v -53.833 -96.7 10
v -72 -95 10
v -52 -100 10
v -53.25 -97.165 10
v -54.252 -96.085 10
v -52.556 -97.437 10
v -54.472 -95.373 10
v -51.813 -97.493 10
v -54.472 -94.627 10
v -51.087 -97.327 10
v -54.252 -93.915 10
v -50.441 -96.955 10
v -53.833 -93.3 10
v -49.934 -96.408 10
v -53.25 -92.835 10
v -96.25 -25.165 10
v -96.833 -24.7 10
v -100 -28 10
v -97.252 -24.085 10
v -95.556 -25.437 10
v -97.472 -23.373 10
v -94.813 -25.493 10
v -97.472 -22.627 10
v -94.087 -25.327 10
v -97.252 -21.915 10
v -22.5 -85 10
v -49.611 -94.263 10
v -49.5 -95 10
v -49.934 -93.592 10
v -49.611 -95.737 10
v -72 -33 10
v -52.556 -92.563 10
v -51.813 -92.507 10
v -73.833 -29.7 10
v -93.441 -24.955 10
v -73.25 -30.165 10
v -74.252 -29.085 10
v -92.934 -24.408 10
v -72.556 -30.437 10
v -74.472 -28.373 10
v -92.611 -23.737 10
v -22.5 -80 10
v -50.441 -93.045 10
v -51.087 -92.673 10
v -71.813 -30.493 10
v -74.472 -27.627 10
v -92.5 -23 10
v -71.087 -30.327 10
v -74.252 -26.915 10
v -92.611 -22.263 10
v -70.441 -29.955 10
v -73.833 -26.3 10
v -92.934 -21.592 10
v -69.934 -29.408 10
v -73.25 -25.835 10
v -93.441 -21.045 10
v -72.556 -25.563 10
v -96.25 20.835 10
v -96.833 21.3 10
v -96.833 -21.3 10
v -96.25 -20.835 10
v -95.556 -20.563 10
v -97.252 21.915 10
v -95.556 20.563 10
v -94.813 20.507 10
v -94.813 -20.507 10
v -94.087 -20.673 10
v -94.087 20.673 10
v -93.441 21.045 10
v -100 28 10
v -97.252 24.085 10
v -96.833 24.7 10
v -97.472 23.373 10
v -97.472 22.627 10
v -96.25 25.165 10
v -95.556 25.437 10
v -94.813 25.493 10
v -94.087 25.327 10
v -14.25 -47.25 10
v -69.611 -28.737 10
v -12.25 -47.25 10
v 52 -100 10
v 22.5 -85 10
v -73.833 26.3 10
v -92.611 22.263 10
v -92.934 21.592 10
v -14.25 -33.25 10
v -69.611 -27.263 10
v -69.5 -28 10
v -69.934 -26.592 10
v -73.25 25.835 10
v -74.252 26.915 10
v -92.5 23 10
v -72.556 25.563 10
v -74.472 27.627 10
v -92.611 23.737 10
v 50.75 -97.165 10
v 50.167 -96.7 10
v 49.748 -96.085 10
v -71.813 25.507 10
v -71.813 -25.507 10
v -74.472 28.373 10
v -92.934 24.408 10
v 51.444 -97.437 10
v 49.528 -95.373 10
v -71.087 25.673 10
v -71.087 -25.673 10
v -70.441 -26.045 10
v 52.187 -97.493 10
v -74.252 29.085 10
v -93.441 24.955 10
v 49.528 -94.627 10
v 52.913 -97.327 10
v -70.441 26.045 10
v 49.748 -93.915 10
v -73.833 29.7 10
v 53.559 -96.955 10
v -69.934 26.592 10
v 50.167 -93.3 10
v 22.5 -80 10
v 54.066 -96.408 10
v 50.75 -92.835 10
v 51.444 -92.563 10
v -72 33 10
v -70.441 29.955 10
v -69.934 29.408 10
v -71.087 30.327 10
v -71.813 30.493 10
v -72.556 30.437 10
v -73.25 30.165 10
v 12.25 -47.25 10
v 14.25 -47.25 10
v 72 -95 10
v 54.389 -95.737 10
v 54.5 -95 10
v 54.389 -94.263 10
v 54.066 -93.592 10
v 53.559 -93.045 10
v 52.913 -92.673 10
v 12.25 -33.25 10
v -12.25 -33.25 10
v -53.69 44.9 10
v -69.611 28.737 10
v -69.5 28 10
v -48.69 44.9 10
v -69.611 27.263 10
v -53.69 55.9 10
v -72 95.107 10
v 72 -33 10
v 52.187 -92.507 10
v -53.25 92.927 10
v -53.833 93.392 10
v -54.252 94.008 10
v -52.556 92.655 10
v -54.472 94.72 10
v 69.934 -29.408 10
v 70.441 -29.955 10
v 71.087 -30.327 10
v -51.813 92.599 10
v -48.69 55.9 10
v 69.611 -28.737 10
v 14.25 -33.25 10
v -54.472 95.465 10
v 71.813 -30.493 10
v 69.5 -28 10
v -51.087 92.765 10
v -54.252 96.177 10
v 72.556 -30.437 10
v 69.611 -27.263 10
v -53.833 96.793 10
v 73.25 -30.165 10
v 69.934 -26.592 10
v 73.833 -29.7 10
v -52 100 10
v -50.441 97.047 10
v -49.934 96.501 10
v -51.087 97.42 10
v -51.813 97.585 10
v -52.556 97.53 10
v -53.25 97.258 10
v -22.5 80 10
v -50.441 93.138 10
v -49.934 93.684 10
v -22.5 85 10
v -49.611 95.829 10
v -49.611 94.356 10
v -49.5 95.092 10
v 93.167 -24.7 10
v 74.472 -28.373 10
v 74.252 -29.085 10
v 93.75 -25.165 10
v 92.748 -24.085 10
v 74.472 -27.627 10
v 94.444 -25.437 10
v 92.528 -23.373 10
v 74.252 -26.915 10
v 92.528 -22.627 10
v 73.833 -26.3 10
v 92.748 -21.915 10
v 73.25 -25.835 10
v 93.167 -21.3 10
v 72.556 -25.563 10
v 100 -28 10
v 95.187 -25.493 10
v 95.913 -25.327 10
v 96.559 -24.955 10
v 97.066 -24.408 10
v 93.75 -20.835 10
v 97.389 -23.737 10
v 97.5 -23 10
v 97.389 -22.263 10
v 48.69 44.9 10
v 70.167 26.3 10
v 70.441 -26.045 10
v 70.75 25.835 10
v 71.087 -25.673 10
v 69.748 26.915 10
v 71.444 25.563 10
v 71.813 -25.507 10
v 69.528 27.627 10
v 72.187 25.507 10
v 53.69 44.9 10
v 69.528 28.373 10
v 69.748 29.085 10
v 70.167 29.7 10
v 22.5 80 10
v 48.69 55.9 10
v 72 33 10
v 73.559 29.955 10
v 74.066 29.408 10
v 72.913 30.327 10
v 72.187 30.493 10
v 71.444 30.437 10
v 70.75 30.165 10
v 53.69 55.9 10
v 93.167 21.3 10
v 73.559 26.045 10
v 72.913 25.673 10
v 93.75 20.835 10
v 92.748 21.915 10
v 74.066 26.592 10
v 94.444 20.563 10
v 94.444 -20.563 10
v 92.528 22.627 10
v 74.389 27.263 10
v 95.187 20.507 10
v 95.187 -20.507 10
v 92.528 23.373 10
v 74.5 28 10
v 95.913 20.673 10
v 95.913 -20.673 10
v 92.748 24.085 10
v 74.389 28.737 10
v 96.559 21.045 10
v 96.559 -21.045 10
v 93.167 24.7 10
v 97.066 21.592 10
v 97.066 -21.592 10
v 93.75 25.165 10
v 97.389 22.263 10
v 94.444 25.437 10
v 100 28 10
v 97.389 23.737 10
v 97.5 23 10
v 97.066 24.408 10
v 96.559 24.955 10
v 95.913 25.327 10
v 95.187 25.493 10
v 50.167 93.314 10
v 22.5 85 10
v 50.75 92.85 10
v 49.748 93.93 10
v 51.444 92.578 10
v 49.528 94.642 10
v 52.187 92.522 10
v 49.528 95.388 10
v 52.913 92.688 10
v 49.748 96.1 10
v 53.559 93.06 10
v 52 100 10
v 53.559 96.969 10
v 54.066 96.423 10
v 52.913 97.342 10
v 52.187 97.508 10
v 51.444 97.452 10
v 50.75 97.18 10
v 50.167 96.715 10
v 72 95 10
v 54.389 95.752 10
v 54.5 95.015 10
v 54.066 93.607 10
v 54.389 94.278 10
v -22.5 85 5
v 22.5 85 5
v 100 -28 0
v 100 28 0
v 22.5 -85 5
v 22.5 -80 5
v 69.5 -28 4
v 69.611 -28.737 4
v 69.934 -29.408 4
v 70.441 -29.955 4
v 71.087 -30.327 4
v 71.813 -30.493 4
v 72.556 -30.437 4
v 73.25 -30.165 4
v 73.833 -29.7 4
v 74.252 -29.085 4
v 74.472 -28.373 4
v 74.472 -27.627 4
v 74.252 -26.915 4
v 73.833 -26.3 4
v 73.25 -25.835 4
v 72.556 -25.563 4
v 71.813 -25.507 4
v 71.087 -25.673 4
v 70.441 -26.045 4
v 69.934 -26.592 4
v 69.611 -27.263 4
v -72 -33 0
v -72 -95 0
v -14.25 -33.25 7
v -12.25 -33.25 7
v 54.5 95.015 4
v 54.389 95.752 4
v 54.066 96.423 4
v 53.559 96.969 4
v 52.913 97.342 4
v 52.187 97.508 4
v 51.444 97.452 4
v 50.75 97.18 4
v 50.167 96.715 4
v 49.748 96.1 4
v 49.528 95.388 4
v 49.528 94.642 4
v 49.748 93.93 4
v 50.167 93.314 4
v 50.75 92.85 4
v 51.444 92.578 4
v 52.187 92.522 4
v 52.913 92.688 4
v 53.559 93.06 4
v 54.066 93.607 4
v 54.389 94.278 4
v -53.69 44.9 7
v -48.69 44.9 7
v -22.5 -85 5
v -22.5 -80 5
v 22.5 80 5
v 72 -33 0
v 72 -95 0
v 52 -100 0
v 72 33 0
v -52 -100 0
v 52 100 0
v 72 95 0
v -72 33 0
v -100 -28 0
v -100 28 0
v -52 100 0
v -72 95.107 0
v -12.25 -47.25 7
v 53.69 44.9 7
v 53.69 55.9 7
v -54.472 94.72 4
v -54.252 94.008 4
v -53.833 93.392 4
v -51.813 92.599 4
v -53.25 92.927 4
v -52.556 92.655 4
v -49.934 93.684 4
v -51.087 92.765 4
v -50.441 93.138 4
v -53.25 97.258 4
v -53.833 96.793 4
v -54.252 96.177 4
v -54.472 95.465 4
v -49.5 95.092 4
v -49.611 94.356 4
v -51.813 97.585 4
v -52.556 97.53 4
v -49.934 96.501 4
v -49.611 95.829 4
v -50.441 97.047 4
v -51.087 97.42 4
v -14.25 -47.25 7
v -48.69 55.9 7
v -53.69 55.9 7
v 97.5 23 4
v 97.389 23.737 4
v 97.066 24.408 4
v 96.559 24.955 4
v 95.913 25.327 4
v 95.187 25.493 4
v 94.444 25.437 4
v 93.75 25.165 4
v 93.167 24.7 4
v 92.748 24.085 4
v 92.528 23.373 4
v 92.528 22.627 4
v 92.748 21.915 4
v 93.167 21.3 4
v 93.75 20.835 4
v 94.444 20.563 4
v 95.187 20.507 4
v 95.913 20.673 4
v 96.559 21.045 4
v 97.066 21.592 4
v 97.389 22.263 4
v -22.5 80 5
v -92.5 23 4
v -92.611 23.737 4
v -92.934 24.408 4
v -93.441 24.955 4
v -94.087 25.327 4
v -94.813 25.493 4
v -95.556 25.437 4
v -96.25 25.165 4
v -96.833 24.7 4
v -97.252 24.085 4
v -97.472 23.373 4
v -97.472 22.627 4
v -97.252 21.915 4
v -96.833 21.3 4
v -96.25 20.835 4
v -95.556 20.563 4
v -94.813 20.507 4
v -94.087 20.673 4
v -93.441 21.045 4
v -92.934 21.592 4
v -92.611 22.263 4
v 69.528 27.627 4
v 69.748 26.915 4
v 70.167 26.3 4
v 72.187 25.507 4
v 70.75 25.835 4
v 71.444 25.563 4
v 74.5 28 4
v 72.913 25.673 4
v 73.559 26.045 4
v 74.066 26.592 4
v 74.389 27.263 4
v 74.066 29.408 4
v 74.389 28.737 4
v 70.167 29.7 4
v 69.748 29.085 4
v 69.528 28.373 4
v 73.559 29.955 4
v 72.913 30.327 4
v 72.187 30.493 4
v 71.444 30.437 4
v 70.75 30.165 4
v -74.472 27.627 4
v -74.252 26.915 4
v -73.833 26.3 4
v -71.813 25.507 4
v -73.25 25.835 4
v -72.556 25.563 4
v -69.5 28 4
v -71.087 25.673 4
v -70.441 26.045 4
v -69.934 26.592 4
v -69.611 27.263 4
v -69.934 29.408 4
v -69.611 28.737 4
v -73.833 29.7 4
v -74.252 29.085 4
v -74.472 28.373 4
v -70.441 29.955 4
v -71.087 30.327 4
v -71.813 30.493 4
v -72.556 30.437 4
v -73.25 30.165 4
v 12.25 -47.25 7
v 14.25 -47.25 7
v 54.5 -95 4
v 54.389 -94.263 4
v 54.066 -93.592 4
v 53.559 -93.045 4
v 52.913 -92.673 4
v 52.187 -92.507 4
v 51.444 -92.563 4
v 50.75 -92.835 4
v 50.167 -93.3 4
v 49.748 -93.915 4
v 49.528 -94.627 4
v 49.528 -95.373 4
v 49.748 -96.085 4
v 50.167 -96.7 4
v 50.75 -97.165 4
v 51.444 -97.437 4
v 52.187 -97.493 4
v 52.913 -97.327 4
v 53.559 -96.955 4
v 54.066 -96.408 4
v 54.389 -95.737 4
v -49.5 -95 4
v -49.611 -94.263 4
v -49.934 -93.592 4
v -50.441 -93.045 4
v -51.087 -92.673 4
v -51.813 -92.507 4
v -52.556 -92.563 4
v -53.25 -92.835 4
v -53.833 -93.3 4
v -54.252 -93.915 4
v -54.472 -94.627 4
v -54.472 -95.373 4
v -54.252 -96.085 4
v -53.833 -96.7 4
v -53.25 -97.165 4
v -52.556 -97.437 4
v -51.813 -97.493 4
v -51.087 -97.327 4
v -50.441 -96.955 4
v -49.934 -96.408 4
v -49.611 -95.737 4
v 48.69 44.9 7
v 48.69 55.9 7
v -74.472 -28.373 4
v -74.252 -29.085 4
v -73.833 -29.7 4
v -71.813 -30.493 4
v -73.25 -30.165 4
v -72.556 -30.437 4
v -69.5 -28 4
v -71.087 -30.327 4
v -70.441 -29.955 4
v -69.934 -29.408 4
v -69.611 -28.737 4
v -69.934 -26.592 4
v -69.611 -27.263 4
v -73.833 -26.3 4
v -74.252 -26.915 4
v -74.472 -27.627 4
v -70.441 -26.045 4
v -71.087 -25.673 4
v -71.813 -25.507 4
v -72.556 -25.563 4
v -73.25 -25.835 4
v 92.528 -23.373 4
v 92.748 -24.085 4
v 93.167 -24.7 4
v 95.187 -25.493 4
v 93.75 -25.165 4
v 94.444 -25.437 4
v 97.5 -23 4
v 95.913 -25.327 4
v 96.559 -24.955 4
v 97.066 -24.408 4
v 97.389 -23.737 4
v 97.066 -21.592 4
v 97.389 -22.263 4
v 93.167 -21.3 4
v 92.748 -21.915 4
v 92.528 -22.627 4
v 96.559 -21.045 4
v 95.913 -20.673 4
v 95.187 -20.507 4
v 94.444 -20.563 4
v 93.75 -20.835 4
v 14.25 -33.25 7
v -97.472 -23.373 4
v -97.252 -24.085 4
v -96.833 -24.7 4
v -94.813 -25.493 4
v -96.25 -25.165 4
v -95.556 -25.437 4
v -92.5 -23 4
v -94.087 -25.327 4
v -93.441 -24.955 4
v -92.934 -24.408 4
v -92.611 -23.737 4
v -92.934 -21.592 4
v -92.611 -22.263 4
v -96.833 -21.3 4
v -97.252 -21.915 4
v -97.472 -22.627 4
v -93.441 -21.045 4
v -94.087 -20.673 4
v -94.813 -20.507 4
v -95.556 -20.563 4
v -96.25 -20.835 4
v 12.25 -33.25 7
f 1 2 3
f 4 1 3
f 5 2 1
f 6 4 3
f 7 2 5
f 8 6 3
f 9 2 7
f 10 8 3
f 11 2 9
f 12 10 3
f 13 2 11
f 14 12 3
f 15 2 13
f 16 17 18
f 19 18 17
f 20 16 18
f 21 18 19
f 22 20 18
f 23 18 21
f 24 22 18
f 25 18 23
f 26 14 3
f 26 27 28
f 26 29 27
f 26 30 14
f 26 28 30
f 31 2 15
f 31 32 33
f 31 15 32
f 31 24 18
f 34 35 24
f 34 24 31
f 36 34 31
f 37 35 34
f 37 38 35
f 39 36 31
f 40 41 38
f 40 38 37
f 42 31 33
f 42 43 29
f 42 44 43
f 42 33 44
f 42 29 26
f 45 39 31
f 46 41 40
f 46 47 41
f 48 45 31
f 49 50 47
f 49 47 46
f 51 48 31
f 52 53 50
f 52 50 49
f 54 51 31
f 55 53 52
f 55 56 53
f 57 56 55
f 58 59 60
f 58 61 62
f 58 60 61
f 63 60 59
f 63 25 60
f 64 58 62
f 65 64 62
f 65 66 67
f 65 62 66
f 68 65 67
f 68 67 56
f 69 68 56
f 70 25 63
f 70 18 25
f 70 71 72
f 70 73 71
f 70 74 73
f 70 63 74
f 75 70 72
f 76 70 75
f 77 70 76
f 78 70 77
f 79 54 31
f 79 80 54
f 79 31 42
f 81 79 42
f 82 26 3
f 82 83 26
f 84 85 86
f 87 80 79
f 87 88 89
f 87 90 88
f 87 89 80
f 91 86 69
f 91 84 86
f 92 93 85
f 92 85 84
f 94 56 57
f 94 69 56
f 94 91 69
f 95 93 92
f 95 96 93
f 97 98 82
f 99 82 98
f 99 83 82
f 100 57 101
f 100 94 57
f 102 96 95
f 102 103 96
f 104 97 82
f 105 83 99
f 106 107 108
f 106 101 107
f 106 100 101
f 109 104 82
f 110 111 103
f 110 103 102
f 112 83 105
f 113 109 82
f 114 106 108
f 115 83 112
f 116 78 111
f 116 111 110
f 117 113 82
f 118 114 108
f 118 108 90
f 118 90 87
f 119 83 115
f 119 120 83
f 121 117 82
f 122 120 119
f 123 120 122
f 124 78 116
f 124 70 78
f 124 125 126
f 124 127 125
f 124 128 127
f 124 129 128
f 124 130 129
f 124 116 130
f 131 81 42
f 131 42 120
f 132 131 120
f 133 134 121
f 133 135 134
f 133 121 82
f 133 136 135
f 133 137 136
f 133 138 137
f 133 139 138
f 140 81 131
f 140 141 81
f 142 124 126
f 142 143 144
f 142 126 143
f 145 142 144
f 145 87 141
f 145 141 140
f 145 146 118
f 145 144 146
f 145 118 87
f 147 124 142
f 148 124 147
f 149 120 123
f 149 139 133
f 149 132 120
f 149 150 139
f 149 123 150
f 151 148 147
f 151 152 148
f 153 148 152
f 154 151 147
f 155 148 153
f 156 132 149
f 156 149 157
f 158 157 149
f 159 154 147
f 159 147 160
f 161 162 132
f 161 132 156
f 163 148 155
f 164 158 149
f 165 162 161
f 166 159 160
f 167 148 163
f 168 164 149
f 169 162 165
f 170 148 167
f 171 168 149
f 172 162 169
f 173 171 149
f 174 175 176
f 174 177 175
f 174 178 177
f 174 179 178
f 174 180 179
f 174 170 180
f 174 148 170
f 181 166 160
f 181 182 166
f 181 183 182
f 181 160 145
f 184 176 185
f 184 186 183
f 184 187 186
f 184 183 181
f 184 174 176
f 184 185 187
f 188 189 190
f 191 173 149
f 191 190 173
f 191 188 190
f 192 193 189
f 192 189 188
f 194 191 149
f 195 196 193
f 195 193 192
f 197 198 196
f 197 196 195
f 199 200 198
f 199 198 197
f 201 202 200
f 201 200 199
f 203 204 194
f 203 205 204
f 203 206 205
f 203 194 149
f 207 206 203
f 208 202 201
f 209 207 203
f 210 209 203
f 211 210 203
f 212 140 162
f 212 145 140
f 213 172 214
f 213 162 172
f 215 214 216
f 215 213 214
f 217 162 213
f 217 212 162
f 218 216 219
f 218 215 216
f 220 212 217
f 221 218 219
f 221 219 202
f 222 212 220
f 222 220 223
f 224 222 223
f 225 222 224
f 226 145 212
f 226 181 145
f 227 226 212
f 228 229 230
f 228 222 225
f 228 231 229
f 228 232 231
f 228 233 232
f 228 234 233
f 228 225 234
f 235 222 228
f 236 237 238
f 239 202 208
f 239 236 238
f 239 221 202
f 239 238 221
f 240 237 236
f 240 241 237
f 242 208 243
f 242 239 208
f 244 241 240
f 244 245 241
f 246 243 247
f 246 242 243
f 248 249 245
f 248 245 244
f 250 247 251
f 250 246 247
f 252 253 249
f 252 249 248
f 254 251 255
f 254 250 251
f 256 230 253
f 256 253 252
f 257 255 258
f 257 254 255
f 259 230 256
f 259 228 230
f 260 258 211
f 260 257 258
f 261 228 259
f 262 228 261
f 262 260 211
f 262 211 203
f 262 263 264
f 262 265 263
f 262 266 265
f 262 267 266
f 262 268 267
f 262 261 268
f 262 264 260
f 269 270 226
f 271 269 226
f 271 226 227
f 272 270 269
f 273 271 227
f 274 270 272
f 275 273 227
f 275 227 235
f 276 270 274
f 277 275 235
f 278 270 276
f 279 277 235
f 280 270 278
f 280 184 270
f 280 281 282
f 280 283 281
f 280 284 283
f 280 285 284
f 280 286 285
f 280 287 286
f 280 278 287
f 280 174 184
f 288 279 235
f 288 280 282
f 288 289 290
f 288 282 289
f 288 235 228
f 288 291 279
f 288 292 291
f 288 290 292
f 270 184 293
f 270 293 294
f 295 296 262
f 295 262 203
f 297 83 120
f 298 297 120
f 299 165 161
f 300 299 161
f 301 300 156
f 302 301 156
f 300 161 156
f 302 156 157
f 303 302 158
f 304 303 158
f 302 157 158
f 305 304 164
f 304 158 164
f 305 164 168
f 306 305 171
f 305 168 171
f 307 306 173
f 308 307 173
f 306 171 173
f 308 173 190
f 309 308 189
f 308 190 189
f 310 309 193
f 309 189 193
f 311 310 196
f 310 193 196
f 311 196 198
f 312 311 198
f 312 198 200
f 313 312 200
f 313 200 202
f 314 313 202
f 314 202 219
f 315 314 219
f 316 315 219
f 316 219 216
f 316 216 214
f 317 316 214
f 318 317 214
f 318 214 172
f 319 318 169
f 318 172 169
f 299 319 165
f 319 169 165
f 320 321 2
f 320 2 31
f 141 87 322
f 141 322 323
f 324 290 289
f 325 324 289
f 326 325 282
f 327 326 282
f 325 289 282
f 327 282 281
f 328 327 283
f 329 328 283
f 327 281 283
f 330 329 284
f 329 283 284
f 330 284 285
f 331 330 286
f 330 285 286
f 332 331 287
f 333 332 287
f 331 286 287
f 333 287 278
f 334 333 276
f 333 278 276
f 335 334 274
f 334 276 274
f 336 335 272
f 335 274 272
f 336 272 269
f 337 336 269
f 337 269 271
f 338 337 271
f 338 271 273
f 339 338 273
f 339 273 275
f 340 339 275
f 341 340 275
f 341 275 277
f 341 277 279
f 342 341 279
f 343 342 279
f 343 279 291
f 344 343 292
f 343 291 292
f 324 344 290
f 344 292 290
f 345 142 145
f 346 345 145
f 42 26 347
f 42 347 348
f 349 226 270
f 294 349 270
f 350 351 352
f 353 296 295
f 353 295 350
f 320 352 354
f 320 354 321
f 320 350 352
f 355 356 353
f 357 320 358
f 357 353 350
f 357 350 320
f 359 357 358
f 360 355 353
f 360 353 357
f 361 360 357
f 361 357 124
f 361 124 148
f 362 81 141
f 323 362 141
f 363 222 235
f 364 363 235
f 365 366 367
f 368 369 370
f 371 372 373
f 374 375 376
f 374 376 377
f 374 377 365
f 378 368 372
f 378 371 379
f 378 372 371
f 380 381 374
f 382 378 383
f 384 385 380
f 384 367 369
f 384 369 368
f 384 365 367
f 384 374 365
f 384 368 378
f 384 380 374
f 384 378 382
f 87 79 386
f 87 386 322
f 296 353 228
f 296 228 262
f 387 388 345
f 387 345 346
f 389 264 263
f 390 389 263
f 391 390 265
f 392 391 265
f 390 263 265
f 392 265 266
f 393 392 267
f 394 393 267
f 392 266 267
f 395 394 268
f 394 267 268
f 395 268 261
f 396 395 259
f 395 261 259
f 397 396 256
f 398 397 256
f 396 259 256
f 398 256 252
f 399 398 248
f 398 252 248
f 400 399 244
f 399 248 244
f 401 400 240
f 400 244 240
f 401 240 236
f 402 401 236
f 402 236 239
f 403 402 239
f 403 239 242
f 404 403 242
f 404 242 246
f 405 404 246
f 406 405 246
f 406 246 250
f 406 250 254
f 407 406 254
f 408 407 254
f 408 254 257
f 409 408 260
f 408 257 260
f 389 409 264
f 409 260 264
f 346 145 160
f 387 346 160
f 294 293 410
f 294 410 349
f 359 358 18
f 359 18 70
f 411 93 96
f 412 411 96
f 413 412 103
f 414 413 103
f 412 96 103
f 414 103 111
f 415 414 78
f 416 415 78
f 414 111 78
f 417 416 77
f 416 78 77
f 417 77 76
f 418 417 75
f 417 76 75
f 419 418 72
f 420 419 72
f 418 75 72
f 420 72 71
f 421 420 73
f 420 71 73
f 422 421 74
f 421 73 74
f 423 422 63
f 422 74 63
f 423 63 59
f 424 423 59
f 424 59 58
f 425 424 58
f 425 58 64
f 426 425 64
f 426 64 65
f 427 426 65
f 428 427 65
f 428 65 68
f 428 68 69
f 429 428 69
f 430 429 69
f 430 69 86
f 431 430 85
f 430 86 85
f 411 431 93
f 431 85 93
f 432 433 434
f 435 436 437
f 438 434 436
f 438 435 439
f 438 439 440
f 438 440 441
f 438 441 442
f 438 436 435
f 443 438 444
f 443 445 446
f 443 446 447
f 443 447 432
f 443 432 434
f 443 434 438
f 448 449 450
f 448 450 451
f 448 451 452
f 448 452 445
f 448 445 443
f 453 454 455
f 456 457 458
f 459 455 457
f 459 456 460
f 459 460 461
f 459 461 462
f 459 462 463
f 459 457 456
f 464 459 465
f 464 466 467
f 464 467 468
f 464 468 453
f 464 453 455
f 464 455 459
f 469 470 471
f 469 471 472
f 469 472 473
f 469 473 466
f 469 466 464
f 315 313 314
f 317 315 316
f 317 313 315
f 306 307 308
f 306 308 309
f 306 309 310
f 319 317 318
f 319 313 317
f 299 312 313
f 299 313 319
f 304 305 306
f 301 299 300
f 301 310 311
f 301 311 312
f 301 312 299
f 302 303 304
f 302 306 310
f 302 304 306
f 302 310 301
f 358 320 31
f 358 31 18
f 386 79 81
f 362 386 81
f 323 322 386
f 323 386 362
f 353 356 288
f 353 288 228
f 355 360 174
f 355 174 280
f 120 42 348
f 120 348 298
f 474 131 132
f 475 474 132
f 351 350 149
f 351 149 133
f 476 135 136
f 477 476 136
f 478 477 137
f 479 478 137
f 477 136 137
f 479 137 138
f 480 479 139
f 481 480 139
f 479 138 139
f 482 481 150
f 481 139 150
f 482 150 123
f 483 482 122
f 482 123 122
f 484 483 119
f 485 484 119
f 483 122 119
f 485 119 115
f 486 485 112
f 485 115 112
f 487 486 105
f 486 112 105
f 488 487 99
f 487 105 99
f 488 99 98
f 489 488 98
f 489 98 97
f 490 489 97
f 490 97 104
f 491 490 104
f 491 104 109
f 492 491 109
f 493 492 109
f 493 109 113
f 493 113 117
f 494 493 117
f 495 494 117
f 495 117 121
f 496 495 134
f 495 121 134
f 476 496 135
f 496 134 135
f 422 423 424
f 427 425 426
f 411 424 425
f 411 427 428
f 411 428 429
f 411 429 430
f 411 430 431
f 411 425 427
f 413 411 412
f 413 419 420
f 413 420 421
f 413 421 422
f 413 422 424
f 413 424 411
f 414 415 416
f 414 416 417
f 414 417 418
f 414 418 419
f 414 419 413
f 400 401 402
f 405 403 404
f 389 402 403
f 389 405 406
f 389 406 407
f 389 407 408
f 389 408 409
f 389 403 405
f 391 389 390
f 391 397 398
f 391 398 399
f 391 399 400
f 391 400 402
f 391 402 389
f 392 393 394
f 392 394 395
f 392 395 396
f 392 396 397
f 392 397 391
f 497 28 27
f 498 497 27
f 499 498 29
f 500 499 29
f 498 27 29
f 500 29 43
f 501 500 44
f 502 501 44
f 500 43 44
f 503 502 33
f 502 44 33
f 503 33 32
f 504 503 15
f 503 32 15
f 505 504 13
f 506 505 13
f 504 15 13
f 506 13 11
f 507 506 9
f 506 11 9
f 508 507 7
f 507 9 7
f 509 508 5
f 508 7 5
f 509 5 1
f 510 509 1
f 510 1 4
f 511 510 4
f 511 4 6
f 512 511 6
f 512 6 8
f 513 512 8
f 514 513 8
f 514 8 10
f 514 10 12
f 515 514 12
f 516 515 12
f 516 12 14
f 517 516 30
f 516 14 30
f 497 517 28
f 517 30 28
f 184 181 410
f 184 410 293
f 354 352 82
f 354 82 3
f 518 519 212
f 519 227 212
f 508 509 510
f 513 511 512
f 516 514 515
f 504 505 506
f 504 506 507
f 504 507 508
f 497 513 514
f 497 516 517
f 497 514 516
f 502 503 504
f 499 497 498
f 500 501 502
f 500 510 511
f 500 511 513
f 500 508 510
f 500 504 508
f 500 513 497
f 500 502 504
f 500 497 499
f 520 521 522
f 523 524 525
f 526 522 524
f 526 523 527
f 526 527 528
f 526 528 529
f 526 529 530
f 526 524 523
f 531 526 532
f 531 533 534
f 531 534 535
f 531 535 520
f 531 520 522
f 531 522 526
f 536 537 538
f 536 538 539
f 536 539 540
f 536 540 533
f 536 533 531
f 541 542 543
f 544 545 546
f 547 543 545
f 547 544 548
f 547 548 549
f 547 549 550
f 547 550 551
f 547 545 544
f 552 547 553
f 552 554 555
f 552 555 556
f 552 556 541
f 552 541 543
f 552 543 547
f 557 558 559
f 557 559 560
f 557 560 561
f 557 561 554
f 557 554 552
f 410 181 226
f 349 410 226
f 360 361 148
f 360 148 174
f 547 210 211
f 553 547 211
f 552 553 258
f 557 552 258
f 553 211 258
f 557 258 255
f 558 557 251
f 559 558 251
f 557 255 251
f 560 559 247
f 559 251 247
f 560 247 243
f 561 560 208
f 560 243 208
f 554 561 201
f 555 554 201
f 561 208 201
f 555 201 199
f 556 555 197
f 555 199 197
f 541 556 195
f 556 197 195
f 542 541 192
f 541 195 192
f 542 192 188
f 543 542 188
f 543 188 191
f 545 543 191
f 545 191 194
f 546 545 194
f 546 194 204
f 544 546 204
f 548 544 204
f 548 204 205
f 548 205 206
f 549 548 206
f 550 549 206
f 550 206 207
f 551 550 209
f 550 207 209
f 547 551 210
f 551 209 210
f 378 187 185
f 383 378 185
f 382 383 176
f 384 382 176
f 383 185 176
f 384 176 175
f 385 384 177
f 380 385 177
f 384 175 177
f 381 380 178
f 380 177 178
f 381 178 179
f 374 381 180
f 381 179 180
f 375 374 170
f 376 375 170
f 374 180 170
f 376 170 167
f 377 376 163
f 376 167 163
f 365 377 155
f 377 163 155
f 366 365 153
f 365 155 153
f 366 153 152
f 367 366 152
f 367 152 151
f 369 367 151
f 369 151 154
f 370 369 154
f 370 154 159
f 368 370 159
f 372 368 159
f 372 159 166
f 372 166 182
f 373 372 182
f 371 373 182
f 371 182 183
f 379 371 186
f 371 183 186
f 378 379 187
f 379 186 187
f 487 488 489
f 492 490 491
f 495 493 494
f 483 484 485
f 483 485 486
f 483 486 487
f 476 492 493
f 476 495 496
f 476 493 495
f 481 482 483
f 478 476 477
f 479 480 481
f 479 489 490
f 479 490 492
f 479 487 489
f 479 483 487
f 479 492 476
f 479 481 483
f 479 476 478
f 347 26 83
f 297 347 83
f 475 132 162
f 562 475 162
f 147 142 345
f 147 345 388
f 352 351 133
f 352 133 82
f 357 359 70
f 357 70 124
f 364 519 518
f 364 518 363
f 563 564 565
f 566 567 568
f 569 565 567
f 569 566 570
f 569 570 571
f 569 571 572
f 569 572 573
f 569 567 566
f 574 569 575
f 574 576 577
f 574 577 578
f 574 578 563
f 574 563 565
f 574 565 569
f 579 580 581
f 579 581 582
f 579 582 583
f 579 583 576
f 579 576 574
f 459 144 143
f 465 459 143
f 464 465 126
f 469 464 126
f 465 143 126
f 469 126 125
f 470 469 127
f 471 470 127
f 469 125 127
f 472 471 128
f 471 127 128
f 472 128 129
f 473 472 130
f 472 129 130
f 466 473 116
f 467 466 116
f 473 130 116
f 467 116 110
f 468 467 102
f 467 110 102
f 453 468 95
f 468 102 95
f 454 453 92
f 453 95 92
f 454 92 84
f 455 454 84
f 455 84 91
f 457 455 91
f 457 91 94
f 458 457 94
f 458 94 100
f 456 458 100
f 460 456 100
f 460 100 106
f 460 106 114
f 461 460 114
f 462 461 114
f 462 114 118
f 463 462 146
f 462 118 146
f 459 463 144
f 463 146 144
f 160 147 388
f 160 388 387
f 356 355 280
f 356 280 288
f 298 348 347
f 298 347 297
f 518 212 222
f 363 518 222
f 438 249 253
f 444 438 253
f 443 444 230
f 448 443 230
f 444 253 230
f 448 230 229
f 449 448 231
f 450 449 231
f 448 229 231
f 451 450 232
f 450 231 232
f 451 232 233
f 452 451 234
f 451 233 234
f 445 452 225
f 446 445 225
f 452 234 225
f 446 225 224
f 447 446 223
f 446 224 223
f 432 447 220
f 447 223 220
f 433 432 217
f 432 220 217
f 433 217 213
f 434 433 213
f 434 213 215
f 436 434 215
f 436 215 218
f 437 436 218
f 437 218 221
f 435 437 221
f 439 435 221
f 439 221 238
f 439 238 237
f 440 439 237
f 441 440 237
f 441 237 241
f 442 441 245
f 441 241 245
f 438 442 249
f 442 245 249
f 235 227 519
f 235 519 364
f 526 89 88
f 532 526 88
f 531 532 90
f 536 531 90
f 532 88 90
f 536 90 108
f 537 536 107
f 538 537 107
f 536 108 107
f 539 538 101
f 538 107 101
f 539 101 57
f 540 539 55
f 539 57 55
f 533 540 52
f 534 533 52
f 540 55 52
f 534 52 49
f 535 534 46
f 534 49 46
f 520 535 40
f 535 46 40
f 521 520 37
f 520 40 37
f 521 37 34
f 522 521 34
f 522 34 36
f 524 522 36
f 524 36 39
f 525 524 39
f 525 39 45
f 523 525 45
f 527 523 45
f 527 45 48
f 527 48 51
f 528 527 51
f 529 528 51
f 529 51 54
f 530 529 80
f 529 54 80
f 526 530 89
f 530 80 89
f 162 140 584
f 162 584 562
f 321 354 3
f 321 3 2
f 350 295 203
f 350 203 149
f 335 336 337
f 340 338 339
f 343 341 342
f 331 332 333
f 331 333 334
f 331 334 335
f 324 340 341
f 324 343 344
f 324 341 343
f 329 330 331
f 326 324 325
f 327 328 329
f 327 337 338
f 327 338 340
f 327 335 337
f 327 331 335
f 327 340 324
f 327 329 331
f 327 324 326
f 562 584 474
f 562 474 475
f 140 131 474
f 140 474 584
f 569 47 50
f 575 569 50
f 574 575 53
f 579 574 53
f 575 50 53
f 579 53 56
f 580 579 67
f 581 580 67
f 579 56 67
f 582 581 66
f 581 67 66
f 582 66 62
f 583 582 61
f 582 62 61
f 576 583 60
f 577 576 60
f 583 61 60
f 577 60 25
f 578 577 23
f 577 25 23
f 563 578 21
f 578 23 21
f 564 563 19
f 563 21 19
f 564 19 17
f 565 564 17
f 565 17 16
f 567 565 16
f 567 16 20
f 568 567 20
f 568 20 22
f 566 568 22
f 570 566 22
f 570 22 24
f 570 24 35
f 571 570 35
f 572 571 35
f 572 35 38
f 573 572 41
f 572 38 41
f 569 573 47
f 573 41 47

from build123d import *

# Parameters (mm, degrees)
BOSS_EXTRUDE2_DEPTH  = 15
SKETCH2_W            = 3
SKETCH2_H            = 20
CUT_EXTRUDE2_DEPTH   = 10
SKETCH4_W            = 3
SKETCH4_H            = 20
BOSS_EXTRUDE5_DEPTH  = 10
CUT_EXTRUDE3_DEPTH   = 5
SKETCH6_R            = 2.5
CUT_EXTRUDE4_DEPTH   = 6
SKETCH7_R            = 2.5
BOSS_EXTRUDE6_DEPTH  = 6
SKETCH8_R            = 2.5
CUT_EXTRUDE5_DEPTH   = 6
SKETCH9_W            = 2
SKETCH9_H            = 14
CUT_EXTRUDE6_DEPTH   = 3
SKETCH10_W           = 5
SKETCH10_H           = 11
CUT_EXTRUDE7_DEPTH   = 3
BOSS_EXTRUDE8_DEPTH  = 3
SKETCH12_W           = 5
SKETCH12_H           = 2
CUT_EXTRUDE8_DEPTH   = 3
SKETCH14_W           = 5
SKETCH14_H           = 7.25
BOSS_EXTRUDE9_DEPTH  = 3
SKETCH15_W           = 5
SKETCH15_H           = 7.25
CUT_EXTRUDE9_DEPTH   = 3
SKETCH16_W           = 5
SKETCH16_H           = 7.25
BOSS_EXTRUDE10_DEPTH = 3
SKETCH17_W           = 5
SKETCH17_H           = 7.25
CUT_EXTRUDE10_DEPTH  = 3
SKETCH18_W           = 5
SKETCH18_H           = 7.25
BOSS_EXTRUDE11_DEPTH = 3
SKETCH19_W           = 5
SKETCH19_H           = 7.25
CUT_EXTRUDE11_DEPTH  = 3
SKETCH20_W           = 5
SKETCH20_H           = 7.25
BOSS_EXTRUDE12_DEPTH = 3
SKETCH21_W           = 5
SKETCH21_H           = 7.25
CUT_EXTRUDE12_DEPTH  = 3
SKETCH22_W           = 2
SKETCH22_H           = 7.25
CUT_EXTRUDE13_DEPTH  = 3
SKETCH23_W           = 2
SKETCH23_H           = 7.25
BOSS_EXTRUDE13_DEPTH = 3
SKETCH24_W           = 45
SKETCH24_H           = 5
CUT_EXTRUDE14_DEPTH  = 5
SKETCH25_W           = 45
SKETCH25_H           = 5
BOSS_EXTRUDE17_DEPTH = 5
SKETCH26_W           = 45
SKETCH26_H           = 5
CUT_EXTRUDE16_DEPTH  = 5


with BuildPart() as part:
    # Sketch1 → Boss-Extrude2 (new body)
    with BuildSketch(Plane.XY):
        Polygon((-52, 100), (52, 100), (72, 95), (72, 33), (100, 28), (100, -28), (72, -33), (72, -95), (52, -100), (-52, -100), (-72, -95), (-72, -33), (-100, -28), (-100, 28), (-72, 33), (-72, 95.107401563), align=None)
    extrude(amount=BOSS_EXTRUDE2_DEPTH)

    # Sketch2 → Cut-Extrude2 (cut)
    with BuildSketch(Plane.XY.offset(15)):
        with Locations((-69.5, 80.352031484)):
            Rectangle(SKETCH2_W, SKETCH2_H)
        with Locations((-69.5, 43)):
            Rectangle(SKETCH2_W, SKETCH2_H)
    extrude(amount=-CUT_EXTRUDE2_DEPTH, mode=Mode.SUBTRACT)

    # Sketch4 → Boss-Extrude5 (add)
    with BuildSketch(Plane.XY.offset(15)):
        Polygon((-71, 90.352031484), (-68, 90.352031484), (-68, 70.352031484), (-69.5, 70.352031484), (-71, 70.352031484), align=None)
        with Locations((-69.5, 43)):
            Rectangle(SKETCH4_W, SKETCH4_H)
    extrude(amount=-BOSS_EXTRUDE5_DEPTH)

    # Sketch5 → Cut-Extrude3 (cut)
    with BuildSketch(Plane.XY.offset(15)):
        Polygon((-72, 95.107401563), (-72, 33), (-100, 28), (-100, -28), (-72, -33), (-72, -95), (-52, -100), (52, -100), (72, -95), (72, -33), (100, -28), (100, 28), (72, 33), (72, 95), (52, 100), (-52, 100), align=None)
    extrude(amount=-CUT_EXTRUDE3_DEPTH, mode=Mode.SUBTRACT)

    # Sketch6 → Cut-Extrude4 (cut)
    with BuildSketch(Plane.XY.offset(10)):
        with Locations((-95, -23)):
            Circle(SKETCH6_R)
        with Locations((-72, 28)):
            Circle(SKETCH6_R)
        with Locations((-72, -28)):
            Circle(SKETCH6_R)
        with Locations((-52, -95)):
            Circle(SKETCH6_R)
        with Locations((52, -95)):
            Circle(SKETCH6_R)
        with Locations((67, -28)):
            Circle(SKETCH6_R)
        with Locations((72, 28)):
            Circle(SKETCH6_R)
        with Locations((95, 23)):
            Circle(SKETCH6_R)
        with Locations((-52, 95.092484679)):
            Circle(SKETCH6_R)
        with Locations((52, 95.014916884)):
            Circle(SKETCH6_R)
        with Locations((95, -23)):
            Circle(SKETCH6_R)
        with Locations((-95, 23)):
            Circle(SKETCH6_R)
    extrude(amount=-CUT_EXTRUDE4_DEPTH, mode=Mode.SUBTRACT)

    # Sketch7 → Boss-Extrude6 (add)
    with BuildSketch(Plane.XY.offset(10)):
        with Locations((67, -28)):
            Circle(SKETCH7_R)
    extrude(amount=-BOSS_EXTRUDE6_DEPTH)

    # Sketch8 → Cut-Extrude5 (cut)
    with BuildSketch(Plane.XY.offset(10)):
        with Locations((-72, -28)):
            Circle(SKETCH8_R)
        with Locations((72, -28)):
            Circle(SKETCH8_R)
    extrude(amount=-CUT_EXTRUDE5_DEPTH, mode=Mode.SUBTRACT)

    # Sketch9 → Cut-Extrude6 (cut)
    with BuildSketch(Plane.XY.offset(10)):
        with Locations((-13.25, -33)):
            Rectangle(SKETCH9_W, SKETCH9_H)
        with Locations((13.25, -33)):
            Rectangle(SKETCH9_W, SKETCH9_H)
    extrude(amount=-CUT_EXTRUDE6_DEPTH, mode=Mode.SUBTRACT)

    # Sketch10 → Cut-Extrude7 (cut)
    with BuildSketch(Plane.XY.offset(10)):
        with Locations((-51.19, 52.4)):
            Rectangle(SKETCH10_W, SKETCH10_H)
        with Locations((51.19, 52.4)):
            Rectangle(SKETCH10_W, SKETCH10_H)
    extrude(amount=-CUT_EXTRUDE7_DEPTH, mode=Mode.SUBTRACT)

    # Sketch11 → Boss-Extrude8 (add)
    with BuildSketch(Plane.XY.offset(10)):
        Polygon((-53.69, 55.9), (-48.69, 55.9), (-48.69, 57.549860814), (-48.69, 57.9), (-53.69, 57.9), align=None)
        Polygon((53.69, 57.9), (48.69, 57.9), (48.69, 55.9), (53.69, 55.9), (53.69, 57.549860814), align=None)
    extrude(amount=-BOSS_EXTRUDE8_DEPTH)

    # Sketch12 → Cut-Extrude8 (cut)
    with BuildSketch(Plane.XY.offset(10)):
        with Locations((-51.19, 45.9)):
            Rectangle(SKETCH12_W, SKETCH12_H)
        Polygon((53.69, 46.9), (48.69, 46.9), (48.69, 44.9), (53.69, 44.9), (53.69, 45.878343836), align=None)
    extrude(amount=-CUT_EXTRUDE8_DEPTH, mode=Mode.SUBTRACT)

    # Sketch14 → Boss-Extrude9 (add)
    with BuildSketch(Plane.XY.offset(10)):
        with Locations((-51.19, 48.525)):
            Rectangle(SKETCH14_W, SKETCH14_H)
    extrude(amount=-BOSS_EXTRUDE9_DEPTH)

    # Sketch15 → Cut-Extrude9 (cut)
    with BuildSketch(Plane.XY.offset(10)):
        with Locations((-51.19, 59.525)):
            Rectangle(SKETCH15_W, SKETCH15_H)
    extrude(amount=-CUT_EXTRUDE9_DEPTH, mode=Mode.SUBTRACT)

    # Sketch16 → Boss-Extrude10 (add)
    with BuildSketch(Plane.XY.offset(10)):
        with Locations((51.19, 48.525)):
            Rectangle(SKETCH16_W, SKETCH16_H)
    extrude(amount=-BOSS_EXTRUDE10_DEPTH)

    # Sketch17 → Cut-Extrude10 (cut)
    with BuildSketch(Plane.XY.offset(10)):
        with Locations((51.19, 59.525)):
            Rectangle(SKETCH17_W, SKETCH17_H)
    extrude(amount=-CUT_EXTRUDE10_DEPTH, mode=Mode.SUBTRACT)

    # Sketch18 → Boss-Extrude11 (add)
    with BuildSketch(Plane.XY.offset(10)):
        with Locations((-51.19, 59.525)):
            Rectangle(SKETCH18_W, SKETCH18_H)
    extrude(amount=-BOSS_EXTRUDE11_DEPTH)

    # Sketch19 → Cut-Extrude11 (cut)
    with BuildSketch(Plane.XY.offset(10)):
        with Locations((-51.19, 48.525)):
            Rectangle(SKETCH19_W, SKETCH19_H)
    extrude(amount=-CUT_EXTRUDE11_DEPTH, mode=Mode.SUBTRACT)

    # Sketch20 → Boss-Extrude12 (add)
    with BuildSketch(Plane.XY.offset(10)):
        with Locations((51.19, 59.525)):
            Rectangle(SKETCH20_W, SKETCH20_H)
    extrude(amount=-BOSS_EXTRUDE12_DEPTH)

    # Sketch21 → Cut-Extrude12 (cut)
    with BuildSketch(Plane.XY.offset(10)):
        with Locations((51.19, 48.525)):
            Rectangle(SKETCH21_W, SKETCH21_H)
    extrude(amount=-CUT_EXTRUDE12_DEPTH, mode=Mode.SUBTRACT)

    # Sketch22 → Cut-Extrude13 (cut)
    with BuildSketch(Plane.XY.offset(10)):
        with Locations((-13.25, -43.625)):
            Rectangle(SKETCH22_W, SKETCH22_H)
        with Locations((13.25, -43.625)):
            Rectangle(SKETCH22_W, SKETCH22_H)
    extrude(amount=-CUT_EXTRUDE13_DEPTH, mode=Mode.SUBTRACT)

    # Sketch23 → Boss-Extrude13 (add)
    with BuildSketch(Plane.XY.offset(10)):
        with Locations((-13.25, -29.625)):
            Rectangle(SKETCH23_W, SKETCH23_H)
        with Locations((13.25, -29.625)):
            Rectangle(SKETCH23_W, SKETCH23_H)
    extrude(amount=-BOSS_EXTRUDE13_DEPTH)

    # Sketch24 → Cut-Extrude14 (cut)
    with BuildSketch(Plane.XY.offset(10)):
        with Locations((0, 95.053700781)):
            Rectangle(SKETCH24_W, SKETCH24_H)
        with Locations((0, -95)):
            Rectangle(SKETCH24_W, SKETCH24_H)
    extrude(amount=-CUT_EXTRUDE14_DEPTH, mode=Mode.SUBTRACT)

    # Sketch25 → Boss-Extrude17 (add)
    with BuildSketch(Plane.XY.offset(5)):
        with Locations((0, 95.053700781)):
            Rectangle(SKETCH25_W, SKETCH25_H)
        with Locations((0, -95)):
            Rectangle(SKETCH25_W, SKETCH25_H)
    extrude(amount=BOSS_EXTRUDE17_DEPTH)

    # Sketch26 → Cut-Extrude16 (cut)
    with BuildSketch(Plane.XY.offset(10)):
        with Locations((0, -82.5)):
            Rectangle(SKETCH26_W, SKETCH26_H)
        with Locations((0, 82.5)):
            Rectangle(SKETCH26_W, SKETCH26_H)
    extrude(amount=-CUT_EXTRUDE16_DEPTH, mode=Mode.SUBTRACT)


solid = part.part
